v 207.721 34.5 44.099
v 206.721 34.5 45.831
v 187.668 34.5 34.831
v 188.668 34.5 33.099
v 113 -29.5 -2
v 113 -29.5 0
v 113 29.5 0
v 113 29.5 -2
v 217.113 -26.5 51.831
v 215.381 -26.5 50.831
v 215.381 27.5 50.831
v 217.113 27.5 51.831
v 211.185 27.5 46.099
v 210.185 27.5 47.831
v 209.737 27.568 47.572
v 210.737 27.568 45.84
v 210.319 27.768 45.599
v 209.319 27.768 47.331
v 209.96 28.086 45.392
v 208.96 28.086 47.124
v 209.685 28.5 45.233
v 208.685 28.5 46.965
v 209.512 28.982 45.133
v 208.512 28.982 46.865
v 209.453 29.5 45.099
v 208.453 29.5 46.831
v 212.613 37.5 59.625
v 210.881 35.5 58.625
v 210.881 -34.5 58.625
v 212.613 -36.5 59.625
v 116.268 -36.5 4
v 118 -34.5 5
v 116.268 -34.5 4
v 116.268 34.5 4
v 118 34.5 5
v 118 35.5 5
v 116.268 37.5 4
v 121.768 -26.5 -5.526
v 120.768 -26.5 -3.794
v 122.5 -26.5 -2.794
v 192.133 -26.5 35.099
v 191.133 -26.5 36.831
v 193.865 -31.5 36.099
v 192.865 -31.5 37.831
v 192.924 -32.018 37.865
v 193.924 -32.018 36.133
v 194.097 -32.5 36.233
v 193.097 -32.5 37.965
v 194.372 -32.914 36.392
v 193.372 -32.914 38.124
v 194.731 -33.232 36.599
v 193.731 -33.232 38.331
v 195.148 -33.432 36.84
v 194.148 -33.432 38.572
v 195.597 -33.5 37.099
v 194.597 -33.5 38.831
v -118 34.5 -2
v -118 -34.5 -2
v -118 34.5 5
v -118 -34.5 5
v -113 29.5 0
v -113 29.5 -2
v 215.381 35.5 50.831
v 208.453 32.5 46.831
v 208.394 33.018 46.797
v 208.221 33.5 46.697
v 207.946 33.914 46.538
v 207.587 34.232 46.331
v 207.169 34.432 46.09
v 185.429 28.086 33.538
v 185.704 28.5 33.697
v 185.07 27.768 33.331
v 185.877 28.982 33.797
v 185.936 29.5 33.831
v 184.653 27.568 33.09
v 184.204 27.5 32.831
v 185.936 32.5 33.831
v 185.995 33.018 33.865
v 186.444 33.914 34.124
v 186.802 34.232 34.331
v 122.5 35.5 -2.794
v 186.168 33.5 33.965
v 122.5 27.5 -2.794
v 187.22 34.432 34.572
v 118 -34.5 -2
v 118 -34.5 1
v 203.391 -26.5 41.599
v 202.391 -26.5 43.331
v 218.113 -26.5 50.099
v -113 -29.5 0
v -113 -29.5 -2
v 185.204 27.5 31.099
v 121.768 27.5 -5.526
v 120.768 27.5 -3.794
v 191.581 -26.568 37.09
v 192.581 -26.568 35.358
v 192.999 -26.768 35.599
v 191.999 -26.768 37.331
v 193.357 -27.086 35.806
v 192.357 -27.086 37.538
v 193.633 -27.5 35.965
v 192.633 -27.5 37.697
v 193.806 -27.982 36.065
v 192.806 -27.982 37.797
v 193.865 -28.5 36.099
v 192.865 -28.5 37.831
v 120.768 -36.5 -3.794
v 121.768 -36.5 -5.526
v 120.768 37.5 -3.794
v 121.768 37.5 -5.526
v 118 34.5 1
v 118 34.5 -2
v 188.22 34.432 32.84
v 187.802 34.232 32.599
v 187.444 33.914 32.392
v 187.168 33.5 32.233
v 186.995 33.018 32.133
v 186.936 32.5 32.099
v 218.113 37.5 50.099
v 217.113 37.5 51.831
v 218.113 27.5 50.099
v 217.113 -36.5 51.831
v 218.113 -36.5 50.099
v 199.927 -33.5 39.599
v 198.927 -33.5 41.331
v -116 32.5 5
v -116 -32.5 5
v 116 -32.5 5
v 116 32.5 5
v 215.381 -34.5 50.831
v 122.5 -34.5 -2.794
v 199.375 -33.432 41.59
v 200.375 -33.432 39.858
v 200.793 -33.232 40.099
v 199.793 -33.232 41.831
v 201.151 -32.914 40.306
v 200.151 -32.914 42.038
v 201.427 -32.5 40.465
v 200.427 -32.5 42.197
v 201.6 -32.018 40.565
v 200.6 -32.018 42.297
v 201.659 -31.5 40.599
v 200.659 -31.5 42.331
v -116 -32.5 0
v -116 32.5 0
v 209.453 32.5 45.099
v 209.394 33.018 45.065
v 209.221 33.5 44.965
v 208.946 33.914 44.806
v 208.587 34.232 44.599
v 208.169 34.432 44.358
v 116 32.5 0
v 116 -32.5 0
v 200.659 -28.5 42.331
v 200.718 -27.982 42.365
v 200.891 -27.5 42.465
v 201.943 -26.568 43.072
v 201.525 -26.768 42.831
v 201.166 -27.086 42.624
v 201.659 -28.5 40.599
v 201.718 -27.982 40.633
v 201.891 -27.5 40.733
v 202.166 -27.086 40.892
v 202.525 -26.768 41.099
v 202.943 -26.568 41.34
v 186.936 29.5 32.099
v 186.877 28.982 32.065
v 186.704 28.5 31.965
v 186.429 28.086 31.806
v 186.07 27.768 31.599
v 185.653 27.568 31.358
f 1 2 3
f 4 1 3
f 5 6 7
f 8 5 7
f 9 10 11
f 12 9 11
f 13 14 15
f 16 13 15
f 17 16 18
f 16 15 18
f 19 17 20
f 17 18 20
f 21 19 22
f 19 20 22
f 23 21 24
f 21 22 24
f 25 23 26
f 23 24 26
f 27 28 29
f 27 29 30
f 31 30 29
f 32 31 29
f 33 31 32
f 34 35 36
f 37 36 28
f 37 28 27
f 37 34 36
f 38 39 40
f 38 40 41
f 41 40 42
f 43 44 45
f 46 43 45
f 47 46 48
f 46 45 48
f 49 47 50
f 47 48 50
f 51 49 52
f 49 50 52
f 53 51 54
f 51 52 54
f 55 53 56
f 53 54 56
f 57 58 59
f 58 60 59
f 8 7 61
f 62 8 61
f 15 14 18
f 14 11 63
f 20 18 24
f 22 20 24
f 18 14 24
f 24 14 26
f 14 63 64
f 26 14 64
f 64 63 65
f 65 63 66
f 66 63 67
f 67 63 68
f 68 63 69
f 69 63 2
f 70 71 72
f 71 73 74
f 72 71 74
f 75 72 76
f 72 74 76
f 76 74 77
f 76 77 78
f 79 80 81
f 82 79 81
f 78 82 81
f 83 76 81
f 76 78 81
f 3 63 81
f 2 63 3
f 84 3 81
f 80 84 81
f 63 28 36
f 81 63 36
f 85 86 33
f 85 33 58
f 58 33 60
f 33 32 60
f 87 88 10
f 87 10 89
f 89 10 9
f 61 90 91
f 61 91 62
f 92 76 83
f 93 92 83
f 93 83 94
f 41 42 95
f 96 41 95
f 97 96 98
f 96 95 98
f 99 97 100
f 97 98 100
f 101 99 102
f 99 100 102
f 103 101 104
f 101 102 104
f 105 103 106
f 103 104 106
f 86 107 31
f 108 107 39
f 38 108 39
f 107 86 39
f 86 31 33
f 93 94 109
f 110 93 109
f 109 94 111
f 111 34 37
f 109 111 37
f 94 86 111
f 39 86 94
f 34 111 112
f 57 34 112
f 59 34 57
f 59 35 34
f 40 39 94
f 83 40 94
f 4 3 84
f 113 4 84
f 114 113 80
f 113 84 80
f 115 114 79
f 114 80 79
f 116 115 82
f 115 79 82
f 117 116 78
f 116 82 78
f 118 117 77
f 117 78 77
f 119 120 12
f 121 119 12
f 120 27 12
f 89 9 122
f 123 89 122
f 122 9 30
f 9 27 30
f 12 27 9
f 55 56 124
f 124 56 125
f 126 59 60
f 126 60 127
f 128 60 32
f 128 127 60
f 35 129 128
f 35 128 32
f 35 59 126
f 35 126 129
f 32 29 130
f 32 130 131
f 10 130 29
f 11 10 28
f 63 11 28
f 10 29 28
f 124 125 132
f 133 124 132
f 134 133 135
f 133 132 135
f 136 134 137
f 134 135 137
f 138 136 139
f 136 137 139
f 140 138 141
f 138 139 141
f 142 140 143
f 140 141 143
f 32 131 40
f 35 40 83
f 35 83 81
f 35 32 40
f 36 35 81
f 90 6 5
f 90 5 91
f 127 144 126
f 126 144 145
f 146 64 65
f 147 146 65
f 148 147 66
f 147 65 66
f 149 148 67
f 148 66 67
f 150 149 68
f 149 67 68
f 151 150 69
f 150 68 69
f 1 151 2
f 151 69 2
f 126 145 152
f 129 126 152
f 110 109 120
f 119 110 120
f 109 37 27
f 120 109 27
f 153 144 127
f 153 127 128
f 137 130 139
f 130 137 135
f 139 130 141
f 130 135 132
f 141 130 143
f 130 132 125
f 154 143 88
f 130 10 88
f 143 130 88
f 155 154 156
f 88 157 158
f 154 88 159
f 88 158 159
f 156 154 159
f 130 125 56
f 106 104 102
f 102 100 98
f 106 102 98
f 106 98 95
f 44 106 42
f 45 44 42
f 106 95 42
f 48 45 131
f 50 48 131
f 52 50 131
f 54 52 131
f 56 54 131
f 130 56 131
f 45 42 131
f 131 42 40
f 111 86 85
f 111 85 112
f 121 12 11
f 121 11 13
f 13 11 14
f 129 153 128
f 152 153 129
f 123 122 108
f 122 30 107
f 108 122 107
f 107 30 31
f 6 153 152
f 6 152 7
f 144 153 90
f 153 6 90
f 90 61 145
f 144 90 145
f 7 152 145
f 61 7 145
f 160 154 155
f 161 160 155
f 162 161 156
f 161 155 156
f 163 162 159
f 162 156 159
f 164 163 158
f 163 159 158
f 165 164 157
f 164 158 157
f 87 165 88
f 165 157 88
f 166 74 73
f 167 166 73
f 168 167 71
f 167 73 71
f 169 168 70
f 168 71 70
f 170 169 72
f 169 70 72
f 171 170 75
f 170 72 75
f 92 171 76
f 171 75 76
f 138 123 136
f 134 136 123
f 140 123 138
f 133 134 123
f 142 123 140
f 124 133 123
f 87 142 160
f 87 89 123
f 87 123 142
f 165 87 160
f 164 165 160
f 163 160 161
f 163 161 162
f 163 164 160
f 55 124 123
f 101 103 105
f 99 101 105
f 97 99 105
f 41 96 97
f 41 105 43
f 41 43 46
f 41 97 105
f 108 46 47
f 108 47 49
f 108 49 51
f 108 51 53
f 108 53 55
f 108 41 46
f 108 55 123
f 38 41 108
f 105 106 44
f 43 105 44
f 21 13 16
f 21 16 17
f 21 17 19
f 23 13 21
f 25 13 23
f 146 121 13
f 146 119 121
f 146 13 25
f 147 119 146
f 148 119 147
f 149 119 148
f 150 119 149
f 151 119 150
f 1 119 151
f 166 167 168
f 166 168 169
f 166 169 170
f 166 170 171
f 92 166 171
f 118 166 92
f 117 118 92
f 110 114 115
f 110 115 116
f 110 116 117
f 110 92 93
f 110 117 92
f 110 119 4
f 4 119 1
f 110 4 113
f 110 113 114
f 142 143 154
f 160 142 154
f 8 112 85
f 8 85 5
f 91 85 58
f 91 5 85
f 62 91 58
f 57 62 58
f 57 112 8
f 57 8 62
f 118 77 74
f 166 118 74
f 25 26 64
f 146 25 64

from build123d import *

# Parameters (mm, degrees)
SKETCH1_W                   = 236
SKETCH1_H                   = 69
SKETCH1_W_2                 = 232
SKETCH1_H_2                 = 65
DISPLAY_OUTLINE_DEPTH       = 5
SKETCH3_W                   = 236
SKETCH3_H                   = 69
SKETCH3_W_2                 = 226
SKETCH3_H_2                 = 59
REAR_DISPLAY_RETAINER_DEPTH = 2
SKETCH2_W                   = 74
SKETCH2_H                   = 111.25
SKETCH2_W_2                 = 70
SKETCH2_H_2                 = 107.25
STREAM_DECK_OUTLINE_DEPTH   = 9
STREAM_DECK_RETAINER_DEPTH  = 2


with BuildPart() as part:
    # Sketch1 → Display outline (new body)
    with BuildSketch(Plane.XY):
        Rectangle(SKETCH1_W, SKETCH1_H)
        Rectangle(SKETCH1_W_2, SKETCH1_H_2, mode=Mode.SUBTRACT)
    extrude(amount=DISPLAY_OUTLINE_DEPTH)

    # Sketch3 → Rear display retainer (add)
    with BuildSketch(Plane(origin=(0, 0, 0), x_dir=(-1, 0, 0), z_dir=(0, 0, -1))):
        Rectangle(SKETCH3_W, SKETCH3_H)
        Rectangle(SKETCH3_W_2, SKETCH3_H_2, mode=Mode.SUBTRACT)
    extrude(amount=REAR_DISPLAY_RETAINER_DEPTH)

    # Sketch2 → Stream deck outline (add)
    with BuildSketch(Plane(origin=(27.334936491, 0, -47.345498823), x_dir=(0, 1, 0), z_dir=(-0.5000000000000041, 0, 0.8660254037844364))):
        with Locations((0.5, -158.315997647)):
            Rectangle(SKETCH2_W, SKETCH2_H)
        with Locations((0.5, -158.315997647)):
            Rectangle(SKETCH2_W_2, SKETCH2_H_2, mode=Mode.SUBTRACT)
    extrude(amount=-STREAM_DECK_OUTLINE_DEPTH)

    # Sketch4 → Stream deck retainer (add)
    with BuildSketch(Plane(origin=(31.834936491, 0, -55.139727457), x_dir=(-0.8660254037844363, 0, -0.5000000000000042), z_dir=(0.5000000000000041, 0, -0.8660254037844362))):
        with BuildLine():
            Line((-213.940997647, 27.5), (-205.940997647, 27.5))
            ThreePointArc((-205.940997647, 27.5), (-204.526784084, 28.085786438), (-203.940997647, 29.5))
            Line((-203.940997647, 29.5), (-203.940997647, 32.5))
            ThreePointArc((-203.940997647, 32.5), (-203.355211209, 33.914213562), (-201.940997647, 34.5))
            Line((-201.940997647, 34.5), (-179.940997647, 34.5))
            ThreePointArc((-179.940997647, 34.5), (-178.526784084, 33.914213562), (-177.940997647, 32.5))
            Line((-177.940997647, 32.5), (-177.940997647, 29.5))
            ThreePointArc((-177.940997647, 29.5), (-177.355211209, 28.085786438), (-175.940997647, 27.5))
            Line((-175.940997647, 27.5), (-102.690997647, 27.5))
            Line((-102.690997647, 27.5), (-102.690997647, 37.5))
            Line((-102.690997647, 37.5), (-213.940997647, 37.5))
            Line((-213.940997647, 37.5), (-213.940997647, 27.5))
        make_face()
        with BuildLine():
            Line((-102.690997647, -36.5), (-102.690997647, -26.5))
            Line((-102.690997647, -26.5), (-183.940997647, -26.5))
            ThreePointArc((-183.940997647, -26.5), (-185.355211209, -27.085786438), (-185.940997647, -28.5))
            Line((-185.940997647, -28.5), (-185.940997647, -31.5))
            ThreePointArc((-185.940997647, -31.5), (-186.526784084, -32.914213562), (-187.940997647, -33.5))
            Line((-187.940997647, -33.5), (-192.940997647, -33.5))
            ThreePointArc((-192.940997647, -33.5), (-194.355211209, -32.914213562), (-194.940997647, -31.5))
            Line((-194.940997647, -31.5), (-194.940997647, -28.5))
            ThreePointArc((-194.940997647, -28.5), (-195.526784084, -27.085786438), (-196.940997647, -26.5))
            Line((-196.940997647, -26.5), (-213.940997647, -26.5))
            Line((-213.940997647, -26.5), (-213.940997647, -36.5))
            Line((-213.940997647, -36.5), (-102.690997647, -36.5))
        make_face()
    extrude(amount=STREAM_DECK_RETAINER_DEPTH)


solid = part.part
